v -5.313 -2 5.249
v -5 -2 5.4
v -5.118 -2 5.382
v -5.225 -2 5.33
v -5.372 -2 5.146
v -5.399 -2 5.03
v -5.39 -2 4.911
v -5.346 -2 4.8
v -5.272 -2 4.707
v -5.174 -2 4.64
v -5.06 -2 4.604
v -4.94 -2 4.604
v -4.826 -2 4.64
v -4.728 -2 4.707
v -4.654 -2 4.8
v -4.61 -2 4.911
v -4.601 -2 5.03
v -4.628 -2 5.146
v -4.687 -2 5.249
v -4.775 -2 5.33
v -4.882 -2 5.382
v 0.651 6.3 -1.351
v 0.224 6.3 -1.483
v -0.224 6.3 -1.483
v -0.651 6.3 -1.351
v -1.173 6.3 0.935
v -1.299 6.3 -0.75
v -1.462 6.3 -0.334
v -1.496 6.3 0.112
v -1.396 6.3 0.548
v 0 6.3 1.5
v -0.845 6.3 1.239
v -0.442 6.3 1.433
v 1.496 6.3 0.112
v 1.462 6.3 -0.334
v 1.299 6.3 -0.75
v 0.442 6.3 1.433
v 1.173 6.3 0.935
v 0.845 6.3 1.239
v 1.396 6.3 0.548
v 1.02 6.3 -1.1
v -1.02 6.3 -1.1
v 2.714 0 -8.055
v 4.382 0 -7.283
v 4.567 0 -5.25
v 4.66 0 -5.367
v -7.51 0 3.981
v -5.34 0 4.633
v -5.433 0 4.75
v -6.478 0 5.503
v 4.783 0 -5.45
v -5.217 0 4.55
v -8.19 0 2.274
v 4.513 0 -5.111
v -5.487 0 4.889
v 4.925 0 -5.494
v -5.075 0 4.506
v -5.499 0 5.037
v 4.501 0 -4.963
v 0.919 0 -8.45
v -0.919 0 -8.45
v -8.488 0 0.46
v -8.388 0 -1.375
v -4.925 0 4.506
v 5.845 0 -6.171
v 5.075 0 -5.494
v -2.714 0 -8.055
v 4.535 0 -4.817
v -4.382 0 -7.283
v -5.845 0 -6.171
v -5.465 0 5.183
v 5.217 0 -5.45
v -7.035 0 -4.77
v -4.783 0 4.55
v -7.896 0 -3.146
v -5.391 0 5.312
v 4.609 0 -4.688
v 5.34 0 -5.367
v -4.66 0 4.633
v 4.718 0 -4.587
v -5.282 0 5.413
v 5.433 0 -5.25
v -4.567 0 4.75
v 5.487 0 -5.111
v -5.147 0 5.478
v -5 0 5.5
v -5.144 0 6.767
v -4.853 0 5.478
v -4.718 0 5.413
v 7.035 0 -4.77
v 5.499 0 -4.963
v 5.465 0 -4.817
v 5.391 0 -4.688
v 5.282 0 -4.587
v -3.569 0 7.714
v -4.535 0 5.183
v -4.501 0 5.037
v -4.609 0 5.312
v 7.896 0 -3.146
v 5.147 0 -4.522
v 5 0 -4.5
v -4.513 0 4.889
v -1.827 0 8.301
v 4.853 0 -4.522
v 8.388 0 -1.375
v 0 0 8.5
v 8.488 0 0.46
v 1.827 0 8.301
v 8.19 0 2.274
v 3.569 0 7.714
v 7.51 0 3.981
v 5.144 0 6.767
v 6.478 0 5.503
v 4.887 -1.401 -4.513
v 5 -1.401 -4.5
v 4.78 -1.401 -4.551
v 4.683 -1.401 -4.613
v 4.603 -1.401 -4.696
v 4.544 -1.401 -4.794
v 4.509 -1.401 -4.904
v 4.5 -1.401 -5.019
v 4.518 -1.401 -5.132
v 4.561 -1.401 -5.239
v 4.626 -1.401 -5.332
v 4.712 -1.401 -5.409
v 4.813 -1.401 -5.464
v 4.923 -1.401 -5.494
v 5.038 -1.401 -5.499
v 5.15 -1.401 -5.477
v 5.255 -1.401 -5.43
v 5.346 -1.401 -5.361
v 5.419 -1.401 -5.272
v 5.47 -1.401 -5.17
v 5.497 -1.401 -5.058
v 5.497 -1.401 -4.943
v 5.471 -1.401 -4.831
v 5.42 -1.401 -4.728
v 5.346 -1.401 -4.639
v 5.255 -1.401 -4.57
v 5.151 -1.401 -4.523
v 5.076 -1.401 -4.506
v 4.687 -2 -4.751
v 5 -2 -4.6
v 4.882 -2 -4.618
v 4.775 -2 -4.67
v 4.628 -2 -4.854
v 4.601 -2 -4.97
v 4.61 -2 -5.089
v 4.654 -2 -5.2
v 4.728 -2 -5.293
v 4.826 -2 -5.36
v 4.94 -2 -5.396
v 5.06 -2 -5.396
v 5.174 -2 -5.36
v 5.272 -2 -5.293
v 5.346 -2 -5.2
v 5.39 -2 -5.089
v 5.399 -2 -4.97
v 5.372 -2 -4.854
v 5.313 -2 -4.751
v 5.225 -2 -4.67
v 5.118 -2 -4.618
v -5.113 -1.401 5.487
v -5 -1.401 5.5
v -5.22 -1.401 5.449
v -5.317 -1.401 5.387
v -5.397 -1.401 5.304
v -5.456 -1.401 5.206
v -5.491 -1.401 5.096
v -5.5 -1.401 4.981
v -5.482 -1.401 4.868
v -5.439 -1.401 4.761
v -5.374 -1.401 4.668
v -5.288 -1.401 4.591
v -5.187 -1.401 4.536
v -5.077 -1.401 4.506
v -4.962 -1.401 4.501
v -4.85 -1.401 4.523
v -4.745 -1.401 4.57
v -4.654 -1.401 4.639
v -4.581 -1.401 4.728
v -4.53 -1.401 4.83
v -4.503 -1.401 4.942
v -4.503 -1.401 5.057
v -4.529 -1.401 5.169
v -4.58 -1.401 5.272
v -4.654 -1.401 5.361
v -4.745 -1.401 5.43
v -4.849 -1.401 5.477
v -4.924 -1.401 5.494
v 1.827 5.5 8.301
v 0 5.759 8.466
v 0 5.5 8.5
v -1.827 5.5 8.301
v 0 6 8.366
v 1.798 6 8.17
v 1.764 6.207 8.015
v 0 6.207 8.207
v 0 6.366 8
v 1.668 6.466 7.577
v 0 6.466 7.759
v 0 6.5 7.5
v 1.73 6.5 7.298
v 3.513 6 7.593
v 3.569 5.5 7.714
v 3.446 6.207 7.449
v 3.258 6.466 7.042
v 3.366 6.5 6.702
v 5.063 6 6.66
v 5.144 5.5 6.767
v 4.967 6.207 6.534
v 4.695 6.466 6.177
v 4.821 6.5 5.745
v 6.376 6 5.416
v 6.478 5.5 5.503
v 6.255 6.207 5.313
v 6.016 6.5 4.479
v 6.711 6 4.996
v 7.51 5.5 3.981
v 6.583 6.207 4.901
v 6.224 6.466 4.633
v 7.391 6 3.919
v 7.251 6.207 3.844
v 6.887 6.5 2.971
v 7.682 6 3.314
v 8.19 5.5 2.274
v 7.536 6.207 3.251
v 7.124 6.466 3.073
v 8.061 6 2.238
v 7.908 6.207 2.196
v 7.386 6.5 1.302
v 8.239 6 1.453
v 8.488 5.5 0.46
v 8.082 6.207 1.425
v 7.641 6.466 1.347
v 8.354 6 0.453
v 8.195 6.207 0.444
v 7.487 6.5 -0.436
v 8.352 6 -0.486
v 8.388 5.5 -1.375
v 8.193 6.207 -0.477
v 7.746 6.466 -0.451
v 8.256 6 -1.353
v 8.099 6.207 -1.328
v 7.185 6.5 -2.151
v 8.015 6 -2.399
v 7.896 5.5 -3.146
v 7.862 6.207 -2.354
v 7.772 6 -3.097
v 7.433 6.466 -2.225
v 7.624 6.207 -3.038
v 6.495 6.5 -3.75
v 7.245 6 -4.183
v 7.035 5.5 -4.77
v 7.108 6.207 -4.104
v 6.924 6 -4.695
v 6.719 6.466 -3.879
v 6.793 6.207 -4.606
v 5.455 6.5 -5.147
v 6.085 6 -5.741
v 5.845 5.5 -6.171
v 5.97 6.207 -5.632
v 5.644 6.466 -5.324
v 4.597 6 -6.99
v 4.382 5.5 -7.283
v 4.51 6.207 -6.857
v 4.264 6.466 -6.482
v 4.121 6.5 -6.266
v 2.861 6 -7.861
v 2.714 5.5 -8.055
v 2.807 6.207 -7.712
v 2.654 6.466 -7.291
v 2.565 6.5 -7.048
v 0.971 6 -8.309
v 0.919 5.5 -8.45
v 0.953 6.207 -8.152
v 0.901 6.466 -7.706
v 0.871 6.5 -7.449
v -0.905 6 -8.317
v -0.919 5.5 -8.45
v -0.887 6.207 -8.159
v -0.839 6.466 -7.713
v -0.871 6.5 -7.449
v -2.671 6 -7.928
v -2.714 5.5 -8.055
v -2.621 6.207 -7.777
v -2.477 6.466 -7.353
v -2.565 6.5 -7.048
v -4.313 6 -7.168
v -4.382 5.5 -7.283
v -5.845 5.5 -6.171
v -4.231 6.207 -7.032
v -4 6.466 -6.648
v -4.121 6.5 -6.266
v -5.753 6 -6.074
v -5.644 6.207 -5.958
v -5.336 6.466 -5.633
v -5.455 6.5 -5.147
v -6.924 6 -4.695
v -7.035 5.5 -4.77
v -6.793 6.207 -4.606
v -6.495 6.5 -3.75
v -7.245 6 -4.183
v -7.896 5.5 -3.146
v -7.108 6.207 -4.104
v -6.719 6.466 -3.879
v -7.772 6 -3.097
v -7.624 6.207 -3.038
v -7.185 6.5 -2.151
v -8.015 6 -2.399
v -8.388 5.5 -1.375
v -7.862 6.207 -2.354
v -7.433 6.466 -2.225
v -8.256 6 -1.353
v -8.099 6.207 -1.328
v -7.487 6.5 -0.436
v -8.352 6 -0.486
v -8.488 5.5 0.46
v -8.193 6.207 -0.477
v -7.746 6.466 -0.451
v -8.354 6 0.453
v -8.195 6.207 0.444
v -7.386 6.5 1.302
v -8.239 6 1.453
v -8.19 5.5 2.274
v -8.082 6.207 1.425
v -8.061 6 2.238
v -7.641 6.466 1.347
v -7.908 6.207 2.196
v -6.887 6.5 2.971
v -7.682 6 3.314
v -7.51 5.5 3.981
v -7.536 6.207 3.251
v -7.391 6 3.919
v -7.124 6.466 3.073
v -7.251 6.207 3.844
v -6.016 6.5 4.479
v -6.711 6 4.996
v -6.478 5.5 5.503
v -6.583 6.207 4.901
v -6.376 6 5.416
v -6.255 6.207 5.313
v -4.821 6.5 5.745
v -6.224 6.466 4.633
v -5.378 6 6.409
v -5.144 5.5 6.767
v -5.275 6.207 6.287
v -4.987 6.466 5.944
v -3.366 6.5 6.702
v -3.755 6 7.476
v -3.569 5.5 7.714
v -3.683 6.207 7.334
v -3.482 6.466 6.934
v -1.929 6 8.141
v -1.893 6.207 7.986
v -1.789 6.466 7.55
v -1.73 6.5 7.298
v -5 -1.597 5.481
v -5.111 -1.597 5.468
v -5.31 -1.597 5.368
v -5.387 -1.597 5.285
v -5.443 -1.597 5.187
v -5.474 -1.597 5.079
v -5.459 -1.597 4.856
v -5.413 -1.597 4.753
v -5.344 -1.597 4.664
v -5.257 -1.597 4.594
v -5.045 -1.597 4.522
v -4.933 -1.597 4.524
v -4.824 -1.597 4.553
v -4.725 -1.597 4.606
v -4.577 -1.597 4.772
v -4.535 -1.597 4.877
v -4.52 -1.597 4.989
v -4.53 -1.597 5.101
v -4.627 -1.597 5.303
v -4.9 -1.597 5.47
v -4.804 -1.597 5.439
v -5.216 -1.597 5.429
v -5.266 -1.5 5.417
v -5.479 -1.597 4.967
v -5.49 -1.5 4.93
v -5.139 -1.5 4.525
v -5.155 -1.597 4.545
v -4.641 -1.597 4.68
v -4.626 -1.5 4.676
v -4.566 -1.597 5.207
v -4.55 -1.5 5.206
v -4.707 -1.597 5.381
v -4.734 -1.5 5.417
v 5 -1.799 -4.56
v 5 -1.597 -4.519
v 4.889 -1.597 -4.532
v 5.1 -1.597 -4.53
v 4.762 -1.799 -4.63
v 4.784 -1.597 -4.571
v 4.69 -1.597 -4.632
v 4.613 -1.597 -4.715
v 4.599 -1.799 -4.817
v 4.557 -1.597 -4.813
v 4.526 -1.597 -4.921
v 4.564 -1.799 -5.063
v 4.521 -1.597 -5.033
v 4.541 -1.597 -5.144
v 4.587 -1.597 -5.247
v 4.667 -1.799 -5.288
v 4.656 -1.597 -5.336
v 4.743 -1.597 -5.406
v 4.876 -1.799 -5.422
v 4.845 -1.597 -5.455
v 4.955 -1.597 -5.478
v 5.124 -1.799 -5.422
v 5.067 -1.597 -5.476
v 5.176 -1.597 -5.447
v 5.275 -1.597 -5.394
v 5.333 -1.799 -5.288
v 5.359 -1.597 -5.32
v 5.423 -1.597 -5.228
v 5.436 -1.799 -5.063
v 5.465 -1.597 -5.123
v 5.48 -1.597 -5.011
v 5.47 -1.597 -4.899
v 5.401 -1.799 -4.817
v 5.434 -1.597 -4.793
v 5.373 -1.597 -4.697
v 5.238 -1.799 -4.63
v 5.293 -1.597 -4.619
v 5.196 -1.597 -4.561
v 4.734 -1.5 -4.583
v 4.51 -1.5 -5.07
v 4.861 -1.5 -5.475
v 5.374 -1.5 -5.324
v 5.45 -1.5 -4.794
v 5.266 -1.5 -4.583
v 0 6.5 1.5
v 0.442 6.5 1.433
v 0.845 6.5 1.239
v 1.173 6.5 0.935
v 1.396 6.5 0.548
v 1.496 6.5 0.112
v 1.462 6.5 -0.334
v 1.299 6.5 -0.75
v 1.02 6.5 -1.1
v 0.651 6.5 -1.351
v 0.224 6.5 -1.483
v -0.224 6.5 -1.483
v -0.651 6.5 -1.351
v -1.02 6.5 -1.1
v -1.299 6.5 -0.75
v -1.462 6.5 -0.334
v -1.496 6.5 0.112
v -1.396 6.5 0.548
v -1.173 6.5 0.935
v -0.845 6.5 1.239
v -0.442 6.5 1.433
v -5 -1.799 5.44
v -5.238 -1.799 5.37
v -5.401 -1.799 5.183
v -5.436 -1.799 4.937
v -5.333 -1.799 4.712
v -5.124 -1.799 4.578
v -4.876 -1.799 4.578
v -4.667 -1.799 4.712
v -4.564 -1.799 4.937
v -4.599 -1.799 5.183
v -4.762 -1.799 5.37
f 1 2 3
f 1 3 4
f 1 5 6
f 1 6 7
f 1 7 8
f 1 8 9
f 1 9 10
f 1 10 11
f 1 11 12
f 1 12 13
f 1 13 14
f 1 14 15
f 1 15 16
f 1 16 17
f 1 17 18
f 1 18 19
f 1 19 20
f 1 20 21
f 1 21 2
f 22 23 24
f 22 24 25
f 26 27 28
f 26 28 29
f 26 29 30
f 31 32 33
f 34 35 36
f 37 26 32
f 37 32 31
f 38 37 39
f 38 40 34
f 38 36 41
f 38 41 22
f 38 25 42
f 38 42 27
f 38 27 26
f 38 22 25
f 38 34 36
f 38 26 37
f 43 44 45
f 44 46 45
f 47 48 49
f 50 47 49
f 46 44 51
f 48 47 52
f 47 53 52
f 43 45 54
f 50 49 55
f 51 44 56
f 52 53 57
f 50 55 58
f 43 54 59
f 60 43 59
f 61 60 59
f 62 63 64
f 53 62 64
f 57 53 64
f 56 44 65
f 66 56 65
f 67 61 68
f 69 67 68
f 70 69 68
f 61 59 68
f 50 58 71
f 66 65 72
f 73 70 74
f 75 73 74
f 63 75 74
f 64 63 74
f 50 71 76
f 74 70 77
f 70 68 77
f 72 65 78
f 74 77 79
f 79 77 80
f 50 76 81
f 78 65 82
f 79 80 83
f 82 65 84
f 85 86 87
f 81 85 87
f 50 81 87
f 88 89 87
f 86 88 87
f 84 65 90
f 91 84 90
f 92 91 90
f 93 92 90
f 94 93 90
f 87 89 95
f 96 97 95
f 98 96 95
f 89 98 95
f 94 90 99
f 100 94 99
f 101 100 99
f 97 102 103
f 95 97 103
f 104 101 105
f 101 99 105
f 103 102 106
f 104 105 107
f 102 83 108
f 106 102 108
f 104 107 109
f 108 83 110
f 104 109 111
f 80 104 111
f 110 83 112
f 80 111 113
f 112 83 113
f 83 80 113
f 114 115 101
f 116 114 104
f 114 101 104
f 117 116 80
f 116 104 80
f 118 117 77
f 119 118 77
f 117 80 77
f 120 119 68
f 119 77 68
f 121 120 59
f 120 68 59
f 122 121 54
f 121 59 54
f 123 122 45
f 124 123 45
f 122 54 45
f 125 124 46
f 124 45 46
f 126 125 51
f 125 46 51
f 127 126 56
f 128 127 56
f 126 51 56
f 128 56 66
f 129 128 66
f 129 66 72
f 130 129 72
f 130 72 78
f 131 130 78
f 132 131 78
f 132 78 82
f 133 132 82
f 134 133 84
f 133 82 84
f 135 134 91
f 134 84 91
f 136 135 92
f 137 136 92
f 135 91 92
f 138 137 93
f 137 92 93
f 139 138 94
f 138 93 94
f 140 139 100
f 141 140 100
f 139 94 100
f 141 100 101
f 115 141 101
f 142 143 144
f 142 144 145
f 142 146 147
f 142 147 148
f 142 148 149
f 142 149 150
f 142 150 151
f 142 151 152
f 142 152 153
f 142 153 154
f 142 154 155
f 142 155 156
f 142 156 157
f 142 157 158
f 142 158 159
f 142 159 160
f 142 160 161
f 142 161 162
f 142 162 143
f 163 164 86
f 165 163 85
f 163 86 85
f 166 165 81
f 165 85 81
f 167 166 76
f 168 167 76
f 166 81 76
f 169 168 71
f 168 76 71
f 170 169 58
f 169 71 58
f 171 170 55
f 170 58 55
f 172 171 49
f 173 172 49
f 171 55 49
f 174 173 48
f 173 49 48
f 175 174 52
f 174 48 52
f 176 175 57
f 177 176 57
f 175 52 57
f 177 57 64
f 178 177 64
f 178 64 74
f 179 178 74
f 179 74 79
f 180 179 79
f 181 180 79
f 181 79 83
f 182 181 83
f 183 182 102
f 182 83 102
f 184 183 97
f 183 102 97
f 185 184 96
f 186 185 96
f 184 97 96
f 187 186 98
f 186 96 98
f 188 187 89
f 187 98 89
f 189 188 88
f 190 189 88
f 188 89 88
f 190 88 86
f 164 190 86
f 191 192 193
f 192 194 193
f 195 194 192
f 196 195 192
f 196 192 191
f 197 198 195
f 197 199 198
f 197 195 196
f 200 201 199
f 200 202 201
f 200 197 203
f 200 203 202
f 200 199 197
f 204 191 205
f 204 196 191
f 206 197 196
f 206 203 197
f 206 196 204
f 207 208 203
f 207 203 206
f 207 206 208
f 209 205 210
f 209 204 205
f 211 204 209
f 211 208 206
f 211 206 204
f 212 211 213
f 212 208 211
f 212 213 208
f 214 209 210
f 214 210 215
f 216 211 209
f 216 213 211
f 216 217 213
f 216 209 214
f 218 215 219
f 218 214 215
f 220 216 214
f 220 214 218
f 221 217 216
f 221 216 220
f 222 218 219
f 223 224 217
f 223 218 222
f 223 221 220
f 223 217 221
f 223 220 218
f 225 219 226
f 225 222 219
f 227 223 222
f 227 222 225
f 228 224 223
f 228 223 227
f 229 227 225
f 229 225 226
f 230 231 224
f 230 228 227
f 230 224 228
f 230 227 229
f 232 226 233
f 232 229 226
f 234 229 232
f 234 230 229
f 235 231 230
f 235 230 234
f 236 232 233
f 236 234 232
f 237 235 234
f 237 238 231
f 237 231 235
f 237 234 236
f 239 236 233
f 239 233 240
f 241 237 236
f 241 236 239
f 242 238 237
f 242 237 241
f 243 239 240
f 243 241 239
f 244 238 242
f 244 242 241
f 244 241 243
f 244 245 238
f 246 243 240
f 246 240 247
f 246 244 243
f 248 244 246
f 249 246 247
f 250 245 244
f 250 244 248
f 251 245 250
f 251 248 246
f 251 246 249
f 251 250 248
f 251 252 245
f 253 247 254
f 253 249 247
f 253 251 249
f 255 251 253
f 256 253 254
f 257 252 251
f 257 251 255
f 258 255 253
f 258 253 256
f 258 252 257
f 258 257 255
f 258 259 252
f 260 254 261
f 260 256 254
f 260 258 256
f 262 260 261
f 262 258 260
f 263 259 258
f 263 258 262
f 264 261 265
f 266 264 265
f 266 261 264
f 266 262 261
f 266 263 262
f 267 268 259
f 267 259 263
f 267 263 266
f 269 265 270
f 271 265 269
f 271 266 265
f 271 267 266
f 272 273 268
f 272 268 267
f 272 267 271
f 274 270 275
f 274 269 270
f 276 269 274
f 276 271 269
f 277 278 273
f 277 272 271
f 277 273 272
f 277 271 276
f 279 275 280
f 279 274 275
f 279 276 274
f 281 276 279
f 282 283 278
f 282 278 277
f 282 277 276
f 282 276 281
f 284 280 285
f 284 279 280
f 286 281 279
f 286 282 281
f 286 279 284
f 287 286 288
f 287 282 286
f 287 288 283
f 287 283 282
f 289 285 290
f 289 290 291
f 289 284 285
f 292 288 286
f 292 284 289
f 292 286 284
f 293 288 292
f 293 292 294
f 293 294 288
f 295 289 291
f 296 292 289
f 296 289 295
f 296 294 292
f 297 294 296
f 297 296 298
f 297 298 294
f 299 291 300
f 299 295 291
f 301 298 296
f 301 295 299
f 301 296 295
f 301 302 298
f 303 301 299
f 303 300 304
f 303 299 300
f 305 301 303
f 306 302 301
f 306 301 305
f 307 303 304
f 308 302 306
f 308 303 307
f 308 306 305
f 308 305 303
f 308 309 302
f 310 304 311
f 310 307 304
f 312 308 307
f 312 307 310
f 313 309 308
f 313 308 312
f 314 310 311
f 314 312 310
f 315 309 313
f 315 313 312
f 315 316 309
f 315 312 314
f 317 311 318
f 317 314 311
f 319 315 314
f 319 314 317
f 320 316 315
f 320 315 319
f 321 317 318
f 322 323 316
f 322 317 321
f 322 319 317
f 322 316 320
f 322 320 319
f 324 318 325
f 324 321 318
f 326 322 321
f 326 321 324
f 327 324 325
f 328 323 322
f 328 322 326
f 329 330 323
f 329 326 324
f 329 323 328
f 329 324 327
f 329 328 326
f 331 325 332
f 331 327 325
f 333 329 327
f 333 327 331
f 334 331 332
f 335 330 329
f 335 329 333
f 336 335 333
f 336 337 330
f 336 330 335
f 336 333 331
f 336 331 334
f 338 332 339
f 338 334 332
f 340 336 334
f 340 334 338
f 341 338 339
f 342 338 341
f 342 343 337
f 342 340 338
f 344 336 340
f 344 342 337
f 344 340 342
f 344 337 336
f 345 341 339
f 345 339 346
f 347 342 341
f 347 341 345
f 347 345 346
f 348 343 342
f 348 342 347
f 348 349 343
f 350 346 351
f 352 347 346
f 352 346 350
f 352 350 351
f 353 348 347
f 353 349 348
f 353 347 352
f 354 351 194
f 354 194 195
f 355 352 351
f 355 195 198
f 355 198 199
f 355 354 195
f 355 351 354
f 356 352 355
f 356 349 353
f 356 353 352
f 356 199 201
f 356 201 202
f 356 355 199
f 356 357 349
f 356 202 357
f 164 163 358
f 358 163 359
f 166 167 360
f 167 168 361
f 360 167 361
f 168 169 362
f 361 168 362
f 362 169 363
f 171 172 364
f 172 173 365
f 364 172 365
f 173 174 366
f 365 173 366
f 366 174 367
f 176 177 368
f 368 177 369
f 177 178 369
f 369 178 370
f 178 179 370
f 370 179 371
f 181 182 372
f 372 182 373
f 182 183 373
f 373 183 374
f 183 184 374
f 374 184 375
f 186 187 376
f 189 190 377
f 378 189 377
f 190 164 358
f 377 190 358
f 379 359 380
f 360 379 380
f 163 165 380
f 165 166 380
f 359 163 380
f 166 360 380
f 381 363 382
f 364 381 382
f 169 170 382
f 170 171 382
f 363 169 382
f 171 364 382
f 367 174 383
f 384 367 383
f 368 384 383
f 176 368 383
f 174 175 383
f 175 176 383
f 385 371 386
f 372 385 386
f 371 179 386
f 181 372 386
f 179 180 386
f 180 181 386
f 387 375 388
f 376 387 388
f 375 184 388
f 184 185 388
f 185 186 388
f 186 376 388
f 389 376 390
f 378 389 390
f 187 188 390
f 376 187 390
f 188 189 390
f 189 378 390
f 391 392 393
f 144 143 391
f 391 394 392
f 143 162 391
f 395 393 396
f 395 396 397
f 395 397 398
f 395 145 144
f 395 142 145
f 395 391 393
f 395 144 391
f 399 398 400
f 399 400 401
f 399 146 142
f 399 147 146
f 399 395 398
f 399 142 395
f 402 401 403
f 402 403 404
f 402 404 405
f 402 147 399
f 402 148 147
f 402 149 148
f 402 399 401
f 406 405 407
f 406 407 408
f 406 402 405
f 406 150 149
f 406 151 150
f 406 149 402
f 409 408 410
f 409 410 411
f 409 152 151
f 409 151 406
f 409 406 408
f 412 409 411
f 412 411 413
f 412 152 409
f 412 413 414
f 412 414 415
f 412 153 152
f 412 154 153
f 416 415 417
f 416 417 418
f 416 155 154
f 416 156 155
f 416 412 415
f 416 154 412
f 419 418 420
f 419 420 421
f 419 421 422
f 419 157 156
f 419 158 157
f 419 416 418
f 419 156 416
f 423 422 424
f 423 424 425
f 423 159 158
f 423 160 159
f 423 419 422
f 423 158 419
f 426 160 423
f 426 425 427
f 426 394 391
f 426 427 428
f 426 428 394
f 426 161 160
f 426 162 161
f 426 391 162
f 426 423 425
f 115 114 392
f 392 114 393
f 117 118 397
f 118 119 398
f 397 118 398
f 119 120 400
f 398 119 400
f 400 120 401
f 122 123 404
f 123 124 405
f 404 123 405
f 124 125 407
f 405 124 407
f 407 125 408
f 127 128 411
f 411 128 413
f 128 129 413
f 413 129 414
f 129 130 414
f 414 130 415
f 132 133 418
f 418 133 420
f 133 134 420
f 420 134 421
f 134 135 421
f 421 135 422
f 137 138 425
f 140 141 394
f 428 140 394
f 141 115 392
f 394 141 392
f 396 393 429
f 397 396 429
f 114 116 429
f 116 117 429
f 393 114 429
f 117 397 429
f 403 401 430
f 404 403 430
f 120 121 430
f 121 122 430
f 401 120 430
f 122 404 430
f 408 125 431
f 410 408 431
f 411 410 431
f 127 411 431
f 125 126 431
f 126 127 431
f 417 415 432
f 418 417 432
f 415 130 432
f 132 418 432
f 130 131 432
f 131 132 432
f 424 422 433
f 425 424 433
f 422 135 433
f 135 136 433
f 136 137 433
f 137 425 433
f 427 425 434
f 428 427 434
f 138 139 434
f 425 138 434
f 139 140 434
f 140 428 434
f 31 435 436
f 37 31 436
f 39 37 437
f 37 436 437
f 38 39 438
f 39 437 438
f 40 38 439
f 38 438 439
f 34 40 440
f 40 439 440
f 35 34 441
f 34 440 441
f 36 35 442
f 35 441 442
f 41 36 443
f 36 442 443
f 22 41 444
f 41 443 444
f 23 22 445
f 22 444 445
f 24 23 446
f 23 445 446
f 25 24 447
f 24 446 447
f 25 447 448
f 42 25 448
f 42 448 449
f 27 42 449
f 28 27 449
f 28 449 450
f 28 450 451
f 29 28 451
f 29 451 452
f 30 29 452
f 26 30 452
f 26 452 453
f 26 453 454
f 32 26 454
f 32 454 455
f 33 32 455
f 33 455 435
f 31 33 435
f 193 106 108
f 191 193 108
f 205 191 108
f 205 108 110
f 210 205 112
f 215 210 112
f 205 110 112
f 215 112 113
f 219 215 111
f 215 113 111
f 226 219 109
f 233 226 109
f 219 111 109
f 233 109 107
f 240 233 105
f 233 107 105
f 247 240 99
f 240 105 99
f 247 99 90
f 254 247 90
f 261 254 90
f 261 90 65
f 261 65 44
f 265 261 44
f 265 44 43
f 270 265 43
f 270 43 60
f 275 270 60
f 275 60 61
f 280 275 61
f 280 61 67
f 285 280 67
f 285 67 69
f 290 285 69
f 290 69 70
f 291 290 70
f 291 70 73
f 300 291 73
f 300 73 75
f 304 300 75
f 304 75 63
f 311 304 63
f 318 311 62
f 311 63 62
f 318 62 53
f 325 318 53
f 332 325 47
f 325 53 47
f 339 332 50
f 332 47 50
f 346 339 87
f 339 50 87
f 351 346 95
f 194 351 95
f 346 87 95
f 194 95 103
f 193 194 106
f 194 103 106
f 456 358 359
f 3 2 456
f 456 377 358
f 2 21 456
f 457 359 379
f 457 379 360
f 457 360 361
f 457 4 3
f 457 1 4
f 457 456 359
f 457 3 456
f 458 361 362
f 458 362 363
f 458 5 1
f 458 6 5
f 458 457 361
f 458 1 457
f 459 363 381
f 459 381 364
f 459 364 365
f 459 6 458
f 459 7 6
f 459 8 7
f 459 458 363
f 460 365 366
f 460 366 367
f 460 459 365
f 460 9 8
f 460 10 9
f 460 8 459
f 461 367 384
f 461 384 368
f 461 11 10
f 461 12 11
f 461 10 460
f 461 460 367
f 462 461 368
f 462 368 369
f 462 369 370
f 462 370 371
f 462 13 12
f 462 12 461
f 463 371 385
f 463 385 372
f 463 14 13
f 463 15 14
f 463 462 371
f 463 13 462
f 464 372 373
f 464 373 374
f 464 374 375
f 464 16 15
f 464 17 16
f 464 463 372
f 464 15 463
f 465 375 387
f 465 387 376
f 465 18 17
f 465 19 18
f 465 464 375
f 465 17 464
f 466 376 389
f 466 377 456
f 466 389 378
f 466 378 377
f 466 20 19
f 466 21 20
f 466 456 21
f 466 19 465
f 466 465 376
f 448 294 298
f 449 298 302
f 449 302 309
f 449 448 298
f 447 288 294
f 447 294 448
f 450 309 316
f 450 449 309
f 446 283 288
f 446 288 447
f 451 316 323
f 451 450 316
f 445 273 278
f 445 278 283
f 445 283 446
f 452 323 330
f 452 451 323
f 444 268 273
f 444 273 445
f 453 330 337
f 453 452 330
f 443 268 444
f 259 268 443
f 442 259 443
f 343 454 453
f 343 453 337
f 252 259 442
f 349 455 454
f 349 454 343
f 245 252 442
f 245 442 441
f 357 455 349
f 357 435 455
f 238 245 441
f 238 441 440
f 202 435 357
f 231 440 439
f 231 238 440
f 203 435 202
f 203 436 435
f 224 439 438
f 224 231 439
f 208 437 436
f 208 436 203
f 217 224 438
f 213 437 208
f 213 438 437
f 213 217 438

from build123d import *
from OCP.BRepFilletAPI import BRepFilletAPI_MakeChamfer

# Parameters (mm, degrees)
SKETCH1_R           = 8.5
BOSS_EXTRUDE1_DEPTH = 7.8
SKETCH2_R           = 8.5
SKETCH2_R_2         = 7.8
SKETCH2_R_3         = 1.5
CUT_EXTRUDE1_DEPTH  = 1.5
SKETCH3_R           = 0.5
BOSS_EXTRUDE2_DEPTH = 2
CHAMFER1_SIZE       = 0.5
CHAMFER1_SIZE2      = 0.1
FILLET1_R           = 1
SKETCH4_R           = 7.8
CUT_EXTRUDE2_DEPTH  = 1.3
SKETCH5_R           = 8.5
SKETCH5_R_2         = 7.8
BOSS_EXTRUDE3_DEPTH = 0.2
FILLET2_R           = 1


with BuildPart() as part:
    # Sketch1 → Boss-Extrude1 (new body)
    with BuildSketch(Plane(origin=(0, 0, 0), x_dir=(1, 0, 0), z_dir=(0, 1, 0))):
        with Locations(Location((0, 0, 0), (0, 0, 270))):
            Circle(SKETCH1_R)
    extrude(amount=BOSS_EXTRUDE1_DEPTH)

    # Sketch2 → Cut-Extrude1 (cut)
    with BuildSketch(Plane(origin=(0, 7.8, 0), x_dir=(1, 0, 0), z_dir=(0, 1, 0))):
        with Locations(Location((0, 0, 0), (0, 0, 270))):
            Circle(SKETCH2_R)
        with Locations(Location((0, 0, 0), (0, 0, 270))):
            Circle(SKETCH2_R_2, mode=Mode.SUBTRACT)
        with Locations(Location((0, 0, 0), (0, 0, 270))):
            Circle(SKETCH2_R_3)
    extrude(amount=-CUT_EXTRUDE1_DEPTH, mode=Mode.SUBTRACT)

    # Sketch3 → Boss-Extrude2 (add)
    with BuildSketch(Plane.XZ):
        with Locations(Location((-5, 5, 0), (0, 0, 90))):
            Circle(SKETCH3_R)
        with Locations(Location((5, -5, 0), (0, 0, 90))):
            Circle(SKETCH3_R)
    extrude(amount=BOSS_EXTRUDE2_DEPTH)

    # Chamfer1: one chamfer whose edges measure the first distance from different faces: ONE call of the kernel's chamfer builder (chamfer() names one face for all edges)
    chamfer1_edges_1 = [part.edges().sort_by_distance(p)[0] for p in [
        (-5, -2, 4.5),
    ]]
    chamfer1_side_1 = [part.faces().sort_by_distance(p)[0] for p in [
        (-5, -1, 4.5),
    ]]
    chamfer1_edges_2 = [part.edges().sort_by_distance(p)[0] for p in [
        (5, -2, -5.5),
    ]]
    chamfer1_side_2 = [part.faces().sort_by_distance(p)[0] for p in [
        (5, -1, -5.5),
    ]]
    chamfer1 = BRepFilletAPI_MakeChamfer(part.part.solid().wrapped)
    for e in chamfer1_edges_1:
        chamfer1.Add(CHAMFER1_SIZE, CHAMFER1_SIZE2, e.wrapped, chamfer1_side_1[0].wrapped)  # the first distance lies on this face
    for e in chamfer1_edges_2:
        chamfer1.Add(CHAMFER1_SIZE, CHAMFER1_SIZE2, e.wrapped, chamfer1_side_2[0].wrapped)  # the first distance lies on this face
    add(Compound.cast(chamfer1.Shape()), mode=Mode.REPLACE)

    # Fillet1
    fillet1_edges = [part.edges().sort_by_distance(p)[0] for p in [
        (-5, -1.5, 4.5),
        (5, -1.5, -5.5),
    ]]
    fillet(fillet1_edges, radius=FILLET1_R)

    # Sketch4 → Cut-Extrude2 (cut)
    with BuildSketch(Plane(origin=(0, 7.8, 0), x_dir=(1, 0, 0), z_dir=(0, 1, 0))):
        with Locations(Location((0, 0, 0), (0, 0, 270))):
            Circle(SKETCH4_R)
    extrude(amount=-CUT_EXTRUDE2_DEPTH, mode=Mode.SUBTRACT)

    # Sketch5 → Boss-Extrude3 (add)
    with BuildSketch(Plane(origin=(0, 6.3, 0), x_dir=(1, 0, 0), z_dir=(0, 1, 0))):
        with Locations(Location((0, 0, 0), (0, 0, 270))):
            Circle(SKETCH5_R)
        Circle(SKETCH5_R_2, mode=Mode.SUBTRACT)
    extrude(amount=BOSS_EXTRUDE3_DEPTH)

    # Fillet2
    fillet2_edges = [part.edges().sort_by_distance(p)[0] for p in [
        (0, 6.5, -8.5),
    ]]
    fillet(fillet2_edges, radius=FILLET2_R)


solid = part.part
